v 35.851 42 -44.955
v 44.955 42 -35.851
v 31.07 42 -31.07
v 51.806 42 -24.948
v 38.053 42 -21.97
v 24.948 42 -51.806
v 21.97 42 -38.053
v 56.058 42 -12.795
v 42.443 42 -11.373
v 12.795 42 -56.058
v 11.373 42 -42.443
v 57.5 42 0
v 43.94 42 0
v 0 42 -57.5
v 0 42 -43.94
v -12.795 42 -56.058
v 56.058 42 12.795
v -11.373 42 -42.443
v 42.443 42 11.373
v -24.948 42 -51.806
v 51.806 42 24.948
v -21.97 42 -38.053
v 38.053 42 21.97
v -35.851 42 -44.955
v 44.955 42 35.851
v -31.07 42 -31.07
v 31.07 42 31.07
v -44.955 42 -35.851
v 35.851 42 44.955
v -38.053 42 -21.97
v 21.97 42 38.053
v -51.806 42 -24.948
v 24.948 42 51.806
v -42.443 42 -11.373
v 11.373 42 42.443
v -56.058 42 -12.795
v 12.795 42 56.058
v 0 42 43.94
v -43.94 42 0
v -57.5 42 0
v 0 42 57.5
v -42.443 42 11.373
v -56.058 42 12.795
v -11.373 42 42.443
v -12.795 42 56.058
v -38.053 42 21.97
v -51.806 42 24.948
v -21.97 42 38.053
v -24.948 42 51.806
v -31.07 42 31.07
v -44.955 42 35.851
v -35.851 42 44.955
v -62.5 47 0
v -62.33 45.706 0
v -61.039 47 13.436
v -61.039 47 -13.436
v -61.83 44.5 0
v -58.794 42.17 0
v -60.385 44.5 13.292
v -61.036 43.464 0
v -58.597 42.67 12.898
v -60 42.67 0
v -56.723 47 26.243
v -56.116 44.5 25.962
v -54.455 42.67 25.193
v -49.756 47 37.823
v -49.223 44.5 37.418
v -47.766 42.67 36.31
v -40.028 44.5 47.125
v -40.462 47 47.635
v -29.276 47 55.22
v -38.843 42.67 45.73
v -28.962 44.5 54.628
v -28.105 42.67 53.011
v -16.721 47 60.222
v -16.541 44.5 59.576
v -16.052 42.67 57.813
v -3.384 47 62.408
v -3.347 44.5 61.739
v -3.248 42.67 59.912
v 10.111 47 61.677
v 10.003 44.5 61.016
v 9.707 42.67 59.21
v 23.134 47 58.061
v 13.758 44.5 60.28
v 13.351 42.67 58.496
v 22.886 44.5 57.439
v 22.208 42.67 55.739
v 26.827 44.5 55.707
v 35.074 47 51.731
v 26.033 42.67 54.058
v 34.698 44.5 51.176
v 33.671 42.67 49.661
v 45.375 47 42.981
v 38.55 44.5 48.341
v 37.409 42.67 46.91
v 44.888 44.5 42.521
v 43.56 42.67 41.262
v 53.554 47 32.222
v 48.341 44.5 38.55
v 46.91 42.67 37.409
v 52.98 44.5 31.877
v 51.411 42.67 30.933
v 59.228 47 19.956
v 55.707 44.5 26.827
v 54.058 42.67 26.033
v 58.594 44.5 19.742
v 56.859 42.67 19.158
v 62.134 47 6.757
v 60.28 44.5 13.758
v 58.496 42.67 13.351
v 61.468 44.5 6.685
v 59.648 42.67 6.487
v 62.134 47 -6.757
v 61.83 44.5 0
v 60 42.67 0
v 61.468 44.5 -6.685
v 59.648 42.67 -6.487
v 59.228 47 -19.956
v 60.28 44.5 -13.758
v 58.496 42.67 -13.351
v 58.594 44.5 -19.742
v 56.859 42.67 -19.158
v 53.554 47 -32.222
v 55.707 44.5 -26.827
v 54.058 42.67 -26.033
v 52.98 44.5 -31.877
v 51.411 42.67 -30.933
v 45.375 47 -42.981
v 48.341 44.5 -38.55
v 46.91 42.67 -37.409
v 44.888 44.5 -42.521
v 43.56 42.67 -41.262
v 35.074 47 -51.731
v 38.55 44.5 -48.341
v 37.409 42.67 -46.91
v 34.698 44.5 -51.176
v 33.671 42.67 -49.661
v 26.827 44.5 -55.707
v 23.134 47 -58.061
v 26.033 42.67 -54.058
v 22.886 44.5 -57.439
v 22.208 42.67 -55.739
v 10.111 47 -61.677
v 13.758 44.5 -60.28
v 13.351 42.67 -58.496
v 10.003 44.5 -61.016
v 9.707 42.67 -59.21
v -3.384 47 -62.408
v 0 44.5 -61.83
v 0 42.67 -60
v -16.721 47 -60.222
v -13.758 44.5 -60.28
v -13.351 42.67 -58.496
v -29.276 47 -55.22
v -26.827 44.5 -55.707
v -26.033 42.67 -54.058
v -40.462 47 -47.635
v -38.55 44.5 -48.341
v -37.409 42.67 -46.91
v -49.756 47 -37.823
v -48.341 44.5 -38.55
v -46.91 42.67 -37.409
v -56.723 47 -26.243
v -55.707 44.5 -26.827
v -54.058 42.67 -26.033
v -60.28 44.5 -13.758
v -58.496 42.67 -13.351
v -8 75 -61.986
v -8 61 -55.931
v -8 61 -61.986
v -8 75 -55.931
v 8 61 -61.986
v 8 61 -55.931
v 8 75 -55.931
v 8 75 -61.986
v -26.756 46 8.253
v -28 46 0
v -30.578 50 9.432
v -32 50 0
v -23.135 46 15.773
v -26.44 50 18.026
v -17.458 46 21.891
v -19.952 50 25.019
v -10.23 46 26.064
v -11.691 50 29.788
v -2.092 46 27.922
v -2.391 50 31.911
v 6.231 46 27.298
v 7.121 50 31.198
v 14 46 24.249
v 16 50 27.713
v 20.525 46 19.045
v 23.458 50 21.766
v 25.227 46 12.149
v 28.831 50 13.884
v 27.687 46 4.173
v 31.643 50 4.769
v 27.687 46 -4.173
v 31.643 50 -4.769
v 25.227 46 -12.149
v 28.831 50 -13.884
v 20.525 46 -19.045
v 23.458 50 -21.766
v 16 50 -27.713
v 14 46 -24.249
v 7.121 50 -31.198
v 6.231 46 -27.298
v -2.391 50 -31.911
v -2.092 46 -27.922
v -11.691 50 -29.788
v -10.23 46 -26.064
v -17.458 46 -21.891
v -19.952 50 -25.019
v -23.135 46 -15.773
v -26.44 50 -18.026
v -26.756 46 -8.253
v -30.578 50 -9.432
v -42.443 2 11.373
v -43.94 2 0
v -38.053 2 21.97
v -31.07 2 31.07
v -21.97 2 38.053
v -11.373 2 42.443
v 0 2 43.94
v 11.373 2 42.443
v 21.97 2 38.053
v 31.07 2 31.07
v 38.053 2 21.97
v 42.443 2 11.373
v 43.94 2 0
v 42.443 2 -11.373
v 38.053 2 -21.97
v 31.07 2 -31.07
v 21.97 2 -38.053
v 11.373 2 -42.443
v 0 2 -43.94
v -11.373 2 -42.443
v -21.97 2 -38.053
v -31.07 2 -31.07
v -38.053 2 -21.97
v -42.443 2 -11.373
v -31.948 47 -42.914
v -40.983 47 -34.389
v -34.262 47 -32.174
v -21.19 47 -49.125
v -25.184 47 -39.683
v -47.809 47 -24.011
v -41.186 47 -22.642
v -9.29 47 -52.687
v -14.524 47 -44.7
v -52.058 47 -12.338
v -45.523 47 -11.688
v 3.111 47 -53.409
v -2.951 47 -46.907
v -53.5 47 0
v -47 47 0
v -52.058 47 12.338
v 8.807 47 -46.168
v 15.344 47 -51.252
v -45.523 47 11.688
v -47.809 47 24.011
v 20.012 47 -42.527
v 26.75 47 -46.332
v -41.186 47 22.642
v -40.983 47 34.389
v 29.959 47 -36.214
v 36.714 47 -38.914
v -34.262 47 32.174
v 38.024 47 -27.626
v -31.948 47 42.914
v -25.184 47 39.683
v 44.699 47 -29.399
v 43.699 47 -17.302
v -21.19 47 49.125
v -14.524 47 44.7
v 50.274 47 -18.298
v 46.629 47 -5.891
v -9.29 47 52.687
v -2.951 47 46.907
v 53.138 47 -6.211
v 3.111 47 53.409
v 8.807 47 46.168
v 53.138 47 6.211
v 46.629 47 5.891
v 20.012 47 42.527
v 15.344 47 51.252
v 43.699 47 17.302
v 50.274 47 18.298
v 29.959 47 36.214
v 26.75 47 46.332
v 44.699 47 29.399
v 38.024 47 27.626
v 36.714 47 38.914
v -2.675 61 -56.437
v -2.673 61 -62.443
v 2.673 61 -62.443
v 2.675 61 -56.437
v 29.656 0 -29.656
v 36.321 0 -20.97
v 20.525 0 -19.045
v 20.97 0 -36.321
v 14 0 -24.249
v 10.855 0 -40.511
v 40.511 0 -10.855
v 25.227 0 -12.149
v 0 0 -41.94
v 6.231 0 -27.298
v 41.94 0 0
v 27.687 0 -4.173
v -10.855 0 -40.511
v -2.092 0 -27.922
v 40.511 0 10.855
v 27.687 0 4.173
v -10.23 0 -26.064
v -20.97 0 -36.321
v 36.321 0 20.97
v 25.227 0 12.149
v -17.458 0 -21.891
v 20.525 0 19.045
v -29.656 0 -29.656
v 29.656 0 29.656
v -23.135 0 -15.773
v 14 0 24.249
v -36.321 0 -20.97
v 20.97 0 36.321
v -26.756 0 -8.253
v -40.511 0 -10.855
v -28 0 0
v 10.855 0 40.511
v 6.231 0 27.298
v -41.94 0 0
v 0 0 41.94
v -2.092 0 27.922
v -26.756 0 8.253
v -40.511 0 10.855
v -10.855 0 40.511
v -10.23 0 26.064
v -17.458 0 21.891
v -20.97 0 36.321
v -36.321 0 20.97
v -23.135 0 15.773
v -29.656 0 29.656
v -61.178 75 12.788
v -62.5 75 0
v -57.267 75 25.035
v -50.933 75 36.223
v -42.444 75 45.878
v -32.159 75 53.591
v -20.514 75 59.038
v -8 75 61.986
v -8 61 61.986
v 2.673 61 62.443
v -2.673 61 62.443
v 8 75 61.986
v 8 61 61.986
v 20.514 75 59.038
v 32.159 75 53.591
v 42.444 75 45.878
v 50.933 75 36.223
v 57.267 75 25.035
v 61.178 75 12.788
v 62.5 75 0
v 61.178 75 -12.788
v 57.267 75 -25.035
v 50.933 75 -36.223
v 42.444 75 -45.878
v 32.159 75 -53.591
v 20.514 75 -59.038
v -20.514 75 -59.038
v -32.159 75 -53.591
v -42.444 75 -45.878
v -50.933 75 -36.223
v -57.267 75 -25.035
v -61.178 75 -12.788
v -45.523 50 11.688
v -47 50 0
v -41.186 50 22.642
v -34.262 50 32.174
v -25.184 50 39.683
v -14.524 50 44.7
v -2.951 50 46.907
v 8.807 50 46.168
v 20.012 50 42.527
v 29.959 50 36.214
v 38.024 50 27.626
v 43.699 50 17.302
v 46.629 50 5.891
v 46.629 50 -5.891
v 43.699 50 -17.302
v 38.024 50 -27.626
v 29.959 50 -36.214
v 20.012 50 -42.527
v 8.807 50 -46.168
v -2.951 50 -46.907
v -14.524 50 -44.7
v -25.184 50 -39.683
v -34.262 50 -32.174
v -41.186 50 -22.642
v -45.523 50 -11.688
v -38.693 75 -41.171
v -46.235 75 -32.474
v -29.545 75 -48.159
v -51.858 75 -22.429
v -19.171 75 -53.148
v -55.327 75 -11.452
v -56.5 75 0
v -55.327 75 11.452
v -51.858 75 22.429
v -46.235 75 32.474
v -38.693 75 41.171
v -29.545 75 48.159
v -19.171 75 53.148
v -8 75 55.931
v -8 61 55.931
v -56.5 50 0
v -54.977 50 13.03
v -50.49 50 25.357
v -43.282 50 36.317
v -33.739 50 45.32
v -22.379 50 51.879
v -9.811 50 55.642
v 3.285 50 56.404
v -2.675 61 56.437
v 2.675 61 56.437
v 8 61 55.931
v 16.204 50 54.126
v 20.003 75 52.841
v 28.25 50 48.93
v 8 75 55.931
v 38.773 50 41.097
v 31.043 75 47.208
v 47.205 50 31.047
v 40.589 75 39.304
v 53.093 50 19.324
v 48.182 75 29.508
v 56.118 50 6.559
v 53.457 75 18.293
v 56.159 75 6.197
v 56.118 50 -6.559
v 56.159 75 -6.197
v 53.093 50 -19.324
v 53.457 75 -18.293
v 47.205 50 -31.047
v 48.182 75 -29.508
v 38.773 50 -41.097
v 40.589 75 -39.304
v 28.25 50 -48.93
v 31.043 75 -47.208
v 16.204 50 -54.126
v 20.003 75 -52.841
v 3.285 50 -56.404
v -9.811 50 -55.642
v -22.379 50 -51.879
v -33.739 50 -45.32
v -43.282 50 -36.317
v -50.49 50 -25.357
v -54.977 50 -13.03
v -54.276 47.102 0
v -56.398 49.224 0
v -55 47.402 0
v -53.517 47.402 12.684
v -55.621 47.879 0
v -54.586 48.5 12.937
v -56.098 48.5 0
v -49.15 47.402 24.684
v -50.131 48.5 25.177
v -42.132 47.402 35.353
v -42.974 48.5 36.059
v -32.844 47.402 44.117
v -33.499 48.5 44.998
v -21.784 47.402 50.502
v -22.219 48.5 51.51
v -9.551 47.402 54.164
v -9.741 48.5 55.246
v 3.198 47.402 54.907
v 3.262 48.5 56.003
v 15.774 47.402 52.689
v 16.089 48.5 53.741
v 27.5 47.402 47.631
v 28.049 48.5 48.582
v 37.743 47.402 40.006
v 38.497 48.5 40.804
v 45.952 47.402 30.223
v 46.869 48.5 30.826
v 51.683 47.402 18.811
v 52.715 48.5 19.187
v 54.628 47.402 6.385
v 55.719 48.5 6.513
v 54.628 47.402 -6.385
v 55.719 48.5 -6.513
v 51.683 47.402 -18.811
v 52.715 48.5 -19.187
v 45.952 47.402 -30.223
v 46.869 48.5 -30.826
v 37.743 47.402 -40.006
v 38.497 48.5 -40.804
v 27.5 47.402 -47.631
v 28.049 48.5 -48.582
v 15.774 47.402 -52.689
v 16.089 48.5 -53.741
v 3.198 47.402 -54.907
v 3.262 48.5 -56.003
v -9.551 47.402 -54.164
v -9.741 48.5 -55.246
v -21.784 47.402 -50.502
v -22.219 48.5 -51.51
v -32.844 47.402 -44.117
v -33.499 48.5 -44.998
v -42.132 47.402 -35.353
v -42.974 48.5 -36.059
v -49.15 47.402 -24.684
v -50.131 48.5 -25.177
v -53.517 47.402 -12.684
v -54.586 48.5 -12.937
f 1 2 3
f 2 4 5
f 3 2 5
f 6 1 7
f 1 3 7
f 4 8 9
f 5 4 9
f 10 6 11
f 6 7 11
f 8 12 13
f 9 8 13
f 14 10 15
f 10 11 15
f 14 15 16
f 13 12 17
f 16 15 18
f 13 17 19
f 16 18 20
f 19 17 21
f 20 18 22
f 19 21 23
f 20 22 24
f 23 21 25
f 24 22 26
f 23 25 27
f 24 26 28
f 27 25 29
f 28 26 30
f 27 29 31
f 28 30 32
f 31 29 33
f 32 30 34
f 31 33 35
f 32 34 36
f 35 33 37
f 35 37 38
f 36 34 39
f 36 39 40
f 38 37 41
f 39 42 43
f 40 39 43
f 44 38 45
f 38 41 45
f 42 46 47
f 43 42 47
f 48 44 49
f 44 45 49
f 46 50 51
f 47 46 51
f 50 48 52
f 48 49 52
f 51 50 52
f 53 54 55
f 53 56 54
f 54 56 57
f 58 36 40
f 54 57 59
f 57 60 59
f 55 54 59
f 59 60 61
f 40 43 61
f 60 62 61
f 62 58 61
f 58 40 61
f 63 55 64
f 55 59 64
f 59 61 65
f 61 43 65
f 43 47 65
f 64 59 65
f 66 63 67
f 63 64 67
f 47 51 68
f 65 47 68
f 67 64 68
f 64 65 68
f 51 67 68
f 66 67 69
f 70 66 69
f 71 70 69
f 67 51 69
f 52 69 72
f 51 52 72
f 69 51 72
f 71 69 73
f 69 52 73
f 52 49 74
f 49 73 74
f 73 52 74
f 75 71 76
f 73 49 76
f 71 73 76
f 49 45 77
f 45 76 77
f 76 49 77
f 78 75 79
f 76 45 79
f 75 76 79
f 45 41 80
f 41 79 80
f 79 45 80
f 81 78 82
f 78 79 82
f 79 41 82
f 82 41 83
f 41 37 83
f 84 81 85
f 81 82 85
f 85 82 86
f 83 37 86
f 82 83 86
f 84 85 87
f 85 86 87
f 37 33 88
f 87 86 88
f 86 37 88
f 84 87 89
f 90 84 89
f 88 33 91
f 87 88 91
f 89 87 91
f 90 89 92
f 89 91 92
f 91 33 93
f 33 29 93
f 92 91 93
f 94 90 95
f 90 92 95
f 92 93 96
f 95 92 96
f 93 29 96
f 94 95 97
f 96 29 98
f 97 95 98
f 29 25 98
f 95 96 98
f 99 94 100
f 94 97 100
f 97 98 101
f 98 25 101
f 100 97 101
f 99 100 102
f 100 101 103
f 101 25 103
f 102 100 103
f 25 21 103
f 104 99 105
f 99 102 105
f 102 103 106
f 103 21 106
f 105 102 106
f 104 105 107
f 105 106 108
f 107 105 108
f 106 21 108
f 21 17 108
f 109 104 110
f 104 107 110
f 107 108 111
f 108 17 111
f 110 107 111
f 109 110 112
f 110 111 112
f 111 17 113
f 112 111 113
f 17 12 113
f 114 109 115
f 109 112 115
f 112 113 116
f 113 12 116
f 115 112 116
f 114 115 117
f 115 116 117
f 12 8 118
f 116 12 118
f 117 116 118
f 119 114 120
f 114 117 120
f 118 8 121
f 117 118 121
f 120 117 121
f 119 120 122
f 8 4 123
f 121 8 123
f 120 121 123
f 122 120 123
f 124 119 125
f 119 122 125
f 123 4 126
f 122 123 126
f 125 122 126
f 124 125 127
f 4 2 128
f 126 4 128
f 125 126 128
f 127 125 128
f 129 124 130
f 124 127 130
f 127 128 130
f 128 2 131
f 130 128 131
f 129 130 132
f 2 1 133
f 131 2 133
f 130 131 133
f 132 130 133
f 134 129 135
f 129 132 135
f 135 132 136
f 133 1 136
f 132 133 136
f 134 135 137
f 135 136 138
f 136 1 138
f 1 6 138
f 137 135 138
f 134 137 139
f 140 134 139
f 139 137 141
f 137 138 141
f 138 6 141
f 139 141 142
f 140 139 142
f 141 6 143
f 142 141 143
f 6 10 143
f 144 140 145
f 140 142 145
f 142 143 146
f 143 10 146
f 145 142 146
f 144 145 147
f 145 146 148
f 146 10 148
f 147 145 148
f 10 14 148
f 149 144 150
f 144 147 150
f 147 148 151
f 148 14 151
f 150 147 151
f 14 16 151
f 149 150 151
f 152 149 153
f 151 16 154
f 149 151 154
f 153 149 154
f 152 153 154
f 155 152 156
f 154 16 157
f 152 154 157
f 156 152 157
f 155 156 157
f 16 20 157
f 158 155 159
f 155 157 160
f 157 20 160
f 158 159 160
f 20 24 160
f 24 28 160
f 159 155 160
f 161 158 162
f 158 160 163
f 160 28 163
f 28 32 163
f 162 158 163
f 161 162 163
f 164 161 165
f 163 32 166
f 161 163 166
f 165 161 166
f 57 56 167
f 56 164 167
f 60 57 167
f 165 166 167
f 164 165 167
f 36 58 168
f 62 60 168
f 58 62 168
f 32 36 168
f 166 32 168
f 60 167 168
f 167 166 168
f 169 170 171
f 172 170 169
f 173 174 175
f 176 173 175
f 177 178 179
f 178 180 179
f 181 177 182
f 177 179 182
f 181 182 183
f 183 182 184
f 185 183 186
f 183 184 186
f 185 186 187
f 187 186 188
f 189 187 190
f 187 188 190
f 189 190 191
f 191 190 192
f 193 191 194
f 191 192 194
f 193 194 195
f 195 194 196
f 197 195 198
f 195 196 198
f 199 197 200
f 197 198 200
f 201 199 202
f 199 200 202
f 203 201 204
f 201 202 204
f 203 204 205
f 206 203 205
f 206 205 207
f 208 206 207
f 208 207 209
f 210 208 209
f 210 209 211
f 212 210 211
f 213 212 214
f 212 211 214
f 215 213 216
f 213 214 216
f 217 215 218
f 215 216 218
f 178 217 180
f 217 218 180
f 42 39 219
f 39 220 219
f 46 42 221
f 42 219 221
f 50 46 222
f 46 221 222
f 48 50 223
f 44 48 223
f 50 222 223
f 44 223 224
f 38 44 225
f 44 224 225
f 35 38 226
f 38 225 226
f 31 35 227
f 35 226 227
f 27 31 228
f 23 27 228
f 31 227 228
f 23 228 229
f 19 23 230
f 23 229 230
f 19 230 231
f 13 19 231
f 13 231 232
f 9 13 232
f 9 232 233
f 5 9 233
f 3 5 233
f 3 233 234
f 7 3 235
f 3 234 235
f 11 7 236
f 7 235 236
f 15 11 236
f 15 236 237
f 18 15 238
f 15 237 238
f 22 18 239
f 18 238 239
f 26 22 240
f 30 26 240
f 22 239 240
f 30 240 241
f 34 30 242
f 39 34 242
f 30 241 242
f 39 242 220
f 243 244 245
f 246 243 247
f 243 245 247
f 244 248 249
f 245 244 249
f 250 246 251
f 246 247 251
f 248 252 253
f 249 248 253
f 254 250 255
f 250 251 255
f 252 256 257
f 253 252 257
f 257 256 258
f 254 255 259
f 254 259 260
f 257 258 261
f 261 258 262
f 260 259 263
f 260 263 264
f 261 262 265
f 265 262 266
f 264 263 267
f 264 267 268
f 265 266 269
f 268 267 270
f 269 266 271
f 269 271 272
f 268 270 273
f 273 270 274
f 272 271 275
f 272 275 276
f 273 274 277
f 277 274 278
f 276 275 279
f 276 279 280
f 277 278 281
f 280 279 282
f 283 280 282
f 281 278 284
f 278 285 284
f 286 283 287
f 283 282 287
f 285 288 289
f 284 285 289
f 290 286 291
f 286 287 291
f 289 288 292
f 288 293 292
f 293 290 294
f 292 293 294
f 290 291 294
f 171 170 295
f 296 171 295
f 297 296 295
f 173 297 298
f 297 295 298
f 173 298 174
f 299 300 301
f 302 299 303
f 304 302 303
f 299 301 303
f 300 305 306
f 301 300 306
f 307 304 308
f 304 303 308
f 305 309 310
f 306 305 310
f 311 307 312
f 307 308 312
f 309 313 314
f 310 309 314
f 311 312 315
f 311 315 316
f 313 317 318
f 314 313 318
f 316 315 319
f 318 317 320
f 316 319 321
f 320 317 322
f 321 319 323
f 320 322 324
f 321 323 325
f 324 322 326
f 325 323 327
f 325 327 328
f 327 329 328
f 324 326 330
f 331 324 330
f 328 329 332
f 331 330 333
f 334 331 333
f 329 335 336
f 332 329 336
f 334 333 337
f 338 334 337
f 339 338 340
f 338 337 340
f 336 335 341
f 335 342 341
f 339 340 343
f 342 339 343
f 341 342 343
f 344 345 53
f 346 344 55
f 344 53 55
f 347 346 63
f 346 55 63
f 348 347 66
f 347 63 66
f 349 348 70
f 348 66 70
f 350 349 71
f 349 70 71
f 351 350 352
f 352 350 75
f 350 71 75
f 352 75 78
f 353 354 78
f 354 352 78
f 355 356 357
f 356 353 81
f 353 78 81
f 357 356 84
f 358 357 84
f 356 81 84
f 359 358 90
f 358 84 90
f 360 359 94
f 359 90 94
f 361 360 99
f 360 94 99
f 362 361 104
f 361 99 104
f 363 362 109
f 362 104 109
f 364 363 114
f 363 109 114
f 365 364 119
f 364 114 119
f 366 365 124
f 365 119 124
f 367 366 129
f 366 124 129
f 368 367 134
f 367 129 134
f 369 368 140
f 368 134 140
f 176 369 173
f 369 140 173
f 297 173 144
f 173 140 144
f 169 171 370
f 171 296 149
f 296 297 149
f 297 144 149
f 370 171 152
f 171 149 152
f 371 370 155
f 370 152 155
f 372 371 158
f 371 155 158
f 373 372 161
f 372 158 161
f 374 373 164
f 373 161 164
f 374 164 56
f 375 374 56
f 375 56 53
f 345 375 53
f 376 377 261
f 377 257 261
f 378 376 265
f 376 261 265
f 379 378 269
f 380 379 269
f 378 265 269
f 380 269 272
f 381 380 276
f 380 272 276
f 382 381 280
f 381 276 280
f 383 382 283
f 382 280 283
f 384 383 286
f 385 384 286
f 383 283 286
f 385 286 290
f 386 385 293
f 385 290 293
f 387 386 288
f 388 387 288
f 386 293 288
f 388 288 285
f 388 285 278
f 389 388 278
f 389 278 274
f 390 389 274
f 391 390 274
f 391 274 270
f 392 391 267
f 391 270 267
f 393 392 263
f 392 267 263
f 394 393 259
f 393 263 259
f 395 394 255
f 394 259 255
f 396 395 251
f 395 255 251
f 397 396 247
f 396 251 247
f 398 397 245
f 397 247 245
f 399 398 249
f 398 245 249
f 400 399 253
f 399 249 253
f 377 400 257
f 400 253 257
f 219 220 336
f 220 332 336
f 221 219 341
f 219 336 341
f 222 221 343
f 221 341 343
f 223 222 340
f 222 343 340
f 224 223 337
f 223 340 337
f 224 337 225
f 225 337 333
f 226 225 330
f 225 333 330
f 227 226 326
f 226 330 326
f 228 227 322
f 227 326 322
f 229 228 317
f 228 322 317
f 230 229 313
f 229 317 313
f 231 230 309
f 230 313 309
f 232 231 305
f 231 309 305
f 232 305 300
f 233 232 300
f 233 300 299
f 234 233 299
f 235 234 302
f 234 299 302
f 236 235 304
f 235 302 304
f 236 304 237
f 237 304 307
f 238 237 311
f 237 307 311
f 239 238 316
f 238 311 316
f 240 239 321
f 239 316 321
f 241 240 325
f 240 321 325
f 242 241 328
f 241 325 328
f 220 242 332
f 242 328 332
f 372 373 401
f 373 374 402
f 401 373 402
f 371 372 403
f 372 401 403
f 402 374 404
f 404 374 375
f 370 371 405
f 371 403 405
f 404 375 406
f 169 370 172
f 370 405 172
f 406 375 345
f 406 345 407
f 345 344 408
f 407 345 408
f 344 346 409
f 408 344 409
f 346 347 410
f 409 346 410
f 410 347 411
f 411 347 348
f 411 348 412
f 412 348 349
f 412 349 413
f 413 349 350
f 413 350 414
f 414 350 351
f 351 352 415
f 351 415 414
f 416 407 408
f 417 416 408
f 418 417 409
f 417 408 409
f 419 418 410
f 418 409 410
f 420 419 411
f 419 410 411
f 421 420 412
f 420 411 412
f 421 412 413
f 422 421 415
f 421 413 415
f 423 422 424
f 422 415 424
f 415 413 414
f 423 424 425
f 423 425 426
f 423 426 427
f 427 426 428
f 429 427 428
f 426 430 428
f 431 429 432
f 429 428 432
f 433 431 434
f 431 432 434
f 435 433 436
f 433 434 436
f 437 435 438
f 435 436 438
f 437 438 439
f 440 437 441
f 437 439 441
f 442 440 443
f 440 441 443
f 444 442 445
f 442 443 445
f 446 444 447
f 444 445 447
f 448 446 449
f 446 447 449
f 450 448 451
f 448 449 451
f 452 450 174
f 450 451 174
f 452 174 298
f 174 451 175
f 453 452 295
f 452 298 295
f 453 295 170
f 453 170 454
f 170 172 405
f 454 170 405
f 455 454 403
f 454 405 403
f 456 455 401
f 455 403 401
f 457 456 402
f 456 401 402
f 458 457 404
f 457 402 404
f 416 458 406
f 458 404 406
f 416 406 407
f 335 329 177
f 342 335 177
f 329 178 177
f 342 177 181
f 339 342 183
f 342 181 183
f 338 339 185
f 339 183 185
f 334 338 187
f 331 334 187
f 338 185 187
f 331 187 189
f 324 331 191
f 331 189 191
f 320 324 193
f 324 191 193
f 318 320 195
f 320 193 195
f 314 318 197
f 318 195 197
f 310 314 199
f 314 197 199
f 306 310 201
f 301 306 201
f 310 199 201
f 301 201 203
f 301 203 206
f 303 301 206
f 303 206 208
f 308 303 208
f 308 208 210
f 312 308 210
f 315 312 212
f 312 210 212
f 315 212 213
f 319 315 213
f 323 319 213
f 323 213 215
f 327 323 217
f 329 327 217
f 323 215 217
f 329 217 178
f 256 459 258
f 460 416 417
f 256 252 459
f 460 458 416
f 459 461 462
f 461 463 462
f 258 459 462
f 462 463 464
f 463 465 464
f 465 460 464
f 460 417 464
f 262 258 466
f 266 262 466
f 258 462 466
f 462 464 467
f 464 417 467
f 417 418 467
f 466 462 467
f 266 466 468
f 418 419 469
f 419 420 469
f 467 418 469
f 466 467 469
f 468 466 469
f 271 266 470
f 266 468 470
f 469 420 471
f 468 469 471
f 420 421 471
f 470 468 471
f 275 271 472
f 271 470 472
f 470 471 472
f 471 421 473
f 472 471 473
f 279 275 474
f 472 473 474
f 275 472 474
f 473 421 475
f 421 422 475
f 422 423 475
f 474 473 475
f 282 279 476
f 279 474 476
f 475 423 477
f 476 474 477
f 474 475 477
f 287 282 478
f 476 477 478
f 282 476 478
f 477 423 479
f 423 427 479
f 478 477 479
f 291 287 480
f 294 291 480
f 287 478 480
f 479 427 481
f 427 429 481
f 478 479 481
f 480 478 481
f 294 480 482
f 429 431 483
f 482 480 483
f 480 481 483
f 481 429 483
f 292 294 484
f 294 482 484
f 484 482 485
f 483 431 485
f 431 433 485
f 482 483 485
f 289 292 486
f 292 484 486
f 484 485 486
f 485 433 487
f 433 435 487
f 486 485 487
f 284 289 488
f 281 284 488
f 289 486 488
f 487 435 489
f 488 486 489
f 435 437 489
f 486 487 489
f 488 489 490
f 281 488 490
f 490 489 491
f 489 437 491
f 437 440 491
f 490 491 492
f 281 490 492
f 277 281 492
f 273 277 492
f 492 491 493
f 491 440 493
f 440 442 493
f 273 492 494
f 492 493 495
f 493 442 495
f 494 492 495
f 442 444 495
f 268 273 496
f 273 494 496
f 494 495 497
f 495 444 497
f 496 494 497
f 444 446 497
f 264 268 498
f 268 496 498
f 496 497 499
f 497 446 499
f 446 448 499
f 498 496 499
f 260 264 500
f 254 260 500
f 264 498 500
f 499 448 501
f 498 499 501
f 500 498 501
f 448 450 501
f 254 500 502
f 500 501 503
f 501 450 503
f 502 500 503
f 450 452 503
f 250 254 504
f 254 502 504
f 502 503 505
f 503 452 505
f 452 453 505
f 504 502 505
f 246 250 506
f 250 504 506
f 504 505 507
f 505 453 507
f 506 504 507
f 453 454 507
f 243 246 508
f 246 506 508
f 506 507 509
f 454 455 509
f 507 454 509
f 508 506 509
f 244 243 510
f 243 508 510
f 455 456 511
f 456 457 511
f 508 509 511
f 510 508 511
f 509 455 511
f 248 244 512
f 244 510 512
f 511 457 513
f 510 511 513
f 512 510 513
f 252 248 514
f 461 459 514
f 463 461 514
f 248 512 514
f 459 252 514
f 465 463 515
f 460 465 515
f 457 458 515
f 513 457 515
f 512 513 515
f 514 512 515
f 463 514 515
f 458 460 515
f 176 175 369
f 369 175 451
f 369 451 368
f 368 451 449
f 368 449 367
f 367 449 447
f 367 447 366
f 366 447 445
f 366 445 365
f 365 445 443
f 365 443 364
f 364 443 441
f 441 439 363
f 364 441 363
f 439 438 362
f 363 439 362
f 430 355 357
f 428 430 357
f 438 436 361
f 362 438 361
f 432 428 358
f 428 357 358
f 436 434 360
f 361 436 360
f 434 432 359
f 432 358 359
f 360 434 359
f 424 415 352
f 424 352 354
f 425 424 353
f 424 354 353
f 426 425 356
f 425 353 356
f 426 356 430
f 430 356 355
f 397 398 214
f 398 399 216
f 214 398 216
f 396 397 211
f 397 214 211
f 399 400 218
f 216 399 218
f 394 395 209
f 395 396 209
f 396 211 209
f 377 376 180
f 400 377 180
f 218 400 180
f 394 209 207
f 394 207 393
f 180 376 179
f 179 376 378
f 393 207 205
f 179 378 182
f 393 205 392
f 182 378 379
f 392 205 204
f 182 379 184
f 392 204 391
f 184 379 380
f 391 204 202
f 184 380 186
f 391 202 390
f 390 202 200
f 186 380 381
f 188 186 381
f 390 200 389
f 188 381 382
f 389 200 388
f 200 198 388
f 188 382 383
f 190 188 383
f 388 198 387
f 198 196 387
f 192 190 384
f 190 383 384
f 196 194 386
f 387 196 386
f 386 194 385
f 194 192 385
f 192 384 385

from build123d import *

# Parameters (mm, degrees)
SKETCH2_W          = 16
SKETCH2_H          = 14
CUT_EXTRUDE1_DEPTH = 110.5


with BuildPart() as part:
    # Sketch1 → Revolve1 (revolve)
    with BuildSketch(Plane.XY):
        with BuildLine():
            Line((-28, 0), (-28, 46))
            Line((-28, 46), (-32, 50))
            Line((-32, 50), (-47, 50))
            Line((-47, 50), (-47, 47))
            Line((-47, 47), (-53.5, 47))
            ThreePointArc((-53.5, 47), (-55.621320344, 47.878679656), (-56.5, 50))
            Line((-56.5, 50), (-56.5, 75))
            Line((-56.5, 75), (-62.5, 75))
            Line((-62.5, 75), (-62.5, 47))
            ThreePointArc((-62.5, 47), (-61.035533906, 43.464466094), (-57.5, 42))
            Line((-57.5, 42), (-43.94, 42))
            Line((-43.94, 42), (-43.94, 2))
            Line((-43.94, 2), (-41.94, 0))
            Line((-41.94, 0), (-28, 0))
        make_face()
    revolve(axis=Axis((0, 0, 0), (0, 1, 0)))

    # Sketch2 → Cut-Extrude1 (cut, symmetric)
    with BuildSketch(Plane.XY):
        with Locations((0, 68)):
            Rectangle(SKETCH2_W, SKETCH2_H)
    extrude(amount=CUT_EXTRUDE1_DEPTH, both=True, mode=Mode.SUBTRACT)


solid = part.part
